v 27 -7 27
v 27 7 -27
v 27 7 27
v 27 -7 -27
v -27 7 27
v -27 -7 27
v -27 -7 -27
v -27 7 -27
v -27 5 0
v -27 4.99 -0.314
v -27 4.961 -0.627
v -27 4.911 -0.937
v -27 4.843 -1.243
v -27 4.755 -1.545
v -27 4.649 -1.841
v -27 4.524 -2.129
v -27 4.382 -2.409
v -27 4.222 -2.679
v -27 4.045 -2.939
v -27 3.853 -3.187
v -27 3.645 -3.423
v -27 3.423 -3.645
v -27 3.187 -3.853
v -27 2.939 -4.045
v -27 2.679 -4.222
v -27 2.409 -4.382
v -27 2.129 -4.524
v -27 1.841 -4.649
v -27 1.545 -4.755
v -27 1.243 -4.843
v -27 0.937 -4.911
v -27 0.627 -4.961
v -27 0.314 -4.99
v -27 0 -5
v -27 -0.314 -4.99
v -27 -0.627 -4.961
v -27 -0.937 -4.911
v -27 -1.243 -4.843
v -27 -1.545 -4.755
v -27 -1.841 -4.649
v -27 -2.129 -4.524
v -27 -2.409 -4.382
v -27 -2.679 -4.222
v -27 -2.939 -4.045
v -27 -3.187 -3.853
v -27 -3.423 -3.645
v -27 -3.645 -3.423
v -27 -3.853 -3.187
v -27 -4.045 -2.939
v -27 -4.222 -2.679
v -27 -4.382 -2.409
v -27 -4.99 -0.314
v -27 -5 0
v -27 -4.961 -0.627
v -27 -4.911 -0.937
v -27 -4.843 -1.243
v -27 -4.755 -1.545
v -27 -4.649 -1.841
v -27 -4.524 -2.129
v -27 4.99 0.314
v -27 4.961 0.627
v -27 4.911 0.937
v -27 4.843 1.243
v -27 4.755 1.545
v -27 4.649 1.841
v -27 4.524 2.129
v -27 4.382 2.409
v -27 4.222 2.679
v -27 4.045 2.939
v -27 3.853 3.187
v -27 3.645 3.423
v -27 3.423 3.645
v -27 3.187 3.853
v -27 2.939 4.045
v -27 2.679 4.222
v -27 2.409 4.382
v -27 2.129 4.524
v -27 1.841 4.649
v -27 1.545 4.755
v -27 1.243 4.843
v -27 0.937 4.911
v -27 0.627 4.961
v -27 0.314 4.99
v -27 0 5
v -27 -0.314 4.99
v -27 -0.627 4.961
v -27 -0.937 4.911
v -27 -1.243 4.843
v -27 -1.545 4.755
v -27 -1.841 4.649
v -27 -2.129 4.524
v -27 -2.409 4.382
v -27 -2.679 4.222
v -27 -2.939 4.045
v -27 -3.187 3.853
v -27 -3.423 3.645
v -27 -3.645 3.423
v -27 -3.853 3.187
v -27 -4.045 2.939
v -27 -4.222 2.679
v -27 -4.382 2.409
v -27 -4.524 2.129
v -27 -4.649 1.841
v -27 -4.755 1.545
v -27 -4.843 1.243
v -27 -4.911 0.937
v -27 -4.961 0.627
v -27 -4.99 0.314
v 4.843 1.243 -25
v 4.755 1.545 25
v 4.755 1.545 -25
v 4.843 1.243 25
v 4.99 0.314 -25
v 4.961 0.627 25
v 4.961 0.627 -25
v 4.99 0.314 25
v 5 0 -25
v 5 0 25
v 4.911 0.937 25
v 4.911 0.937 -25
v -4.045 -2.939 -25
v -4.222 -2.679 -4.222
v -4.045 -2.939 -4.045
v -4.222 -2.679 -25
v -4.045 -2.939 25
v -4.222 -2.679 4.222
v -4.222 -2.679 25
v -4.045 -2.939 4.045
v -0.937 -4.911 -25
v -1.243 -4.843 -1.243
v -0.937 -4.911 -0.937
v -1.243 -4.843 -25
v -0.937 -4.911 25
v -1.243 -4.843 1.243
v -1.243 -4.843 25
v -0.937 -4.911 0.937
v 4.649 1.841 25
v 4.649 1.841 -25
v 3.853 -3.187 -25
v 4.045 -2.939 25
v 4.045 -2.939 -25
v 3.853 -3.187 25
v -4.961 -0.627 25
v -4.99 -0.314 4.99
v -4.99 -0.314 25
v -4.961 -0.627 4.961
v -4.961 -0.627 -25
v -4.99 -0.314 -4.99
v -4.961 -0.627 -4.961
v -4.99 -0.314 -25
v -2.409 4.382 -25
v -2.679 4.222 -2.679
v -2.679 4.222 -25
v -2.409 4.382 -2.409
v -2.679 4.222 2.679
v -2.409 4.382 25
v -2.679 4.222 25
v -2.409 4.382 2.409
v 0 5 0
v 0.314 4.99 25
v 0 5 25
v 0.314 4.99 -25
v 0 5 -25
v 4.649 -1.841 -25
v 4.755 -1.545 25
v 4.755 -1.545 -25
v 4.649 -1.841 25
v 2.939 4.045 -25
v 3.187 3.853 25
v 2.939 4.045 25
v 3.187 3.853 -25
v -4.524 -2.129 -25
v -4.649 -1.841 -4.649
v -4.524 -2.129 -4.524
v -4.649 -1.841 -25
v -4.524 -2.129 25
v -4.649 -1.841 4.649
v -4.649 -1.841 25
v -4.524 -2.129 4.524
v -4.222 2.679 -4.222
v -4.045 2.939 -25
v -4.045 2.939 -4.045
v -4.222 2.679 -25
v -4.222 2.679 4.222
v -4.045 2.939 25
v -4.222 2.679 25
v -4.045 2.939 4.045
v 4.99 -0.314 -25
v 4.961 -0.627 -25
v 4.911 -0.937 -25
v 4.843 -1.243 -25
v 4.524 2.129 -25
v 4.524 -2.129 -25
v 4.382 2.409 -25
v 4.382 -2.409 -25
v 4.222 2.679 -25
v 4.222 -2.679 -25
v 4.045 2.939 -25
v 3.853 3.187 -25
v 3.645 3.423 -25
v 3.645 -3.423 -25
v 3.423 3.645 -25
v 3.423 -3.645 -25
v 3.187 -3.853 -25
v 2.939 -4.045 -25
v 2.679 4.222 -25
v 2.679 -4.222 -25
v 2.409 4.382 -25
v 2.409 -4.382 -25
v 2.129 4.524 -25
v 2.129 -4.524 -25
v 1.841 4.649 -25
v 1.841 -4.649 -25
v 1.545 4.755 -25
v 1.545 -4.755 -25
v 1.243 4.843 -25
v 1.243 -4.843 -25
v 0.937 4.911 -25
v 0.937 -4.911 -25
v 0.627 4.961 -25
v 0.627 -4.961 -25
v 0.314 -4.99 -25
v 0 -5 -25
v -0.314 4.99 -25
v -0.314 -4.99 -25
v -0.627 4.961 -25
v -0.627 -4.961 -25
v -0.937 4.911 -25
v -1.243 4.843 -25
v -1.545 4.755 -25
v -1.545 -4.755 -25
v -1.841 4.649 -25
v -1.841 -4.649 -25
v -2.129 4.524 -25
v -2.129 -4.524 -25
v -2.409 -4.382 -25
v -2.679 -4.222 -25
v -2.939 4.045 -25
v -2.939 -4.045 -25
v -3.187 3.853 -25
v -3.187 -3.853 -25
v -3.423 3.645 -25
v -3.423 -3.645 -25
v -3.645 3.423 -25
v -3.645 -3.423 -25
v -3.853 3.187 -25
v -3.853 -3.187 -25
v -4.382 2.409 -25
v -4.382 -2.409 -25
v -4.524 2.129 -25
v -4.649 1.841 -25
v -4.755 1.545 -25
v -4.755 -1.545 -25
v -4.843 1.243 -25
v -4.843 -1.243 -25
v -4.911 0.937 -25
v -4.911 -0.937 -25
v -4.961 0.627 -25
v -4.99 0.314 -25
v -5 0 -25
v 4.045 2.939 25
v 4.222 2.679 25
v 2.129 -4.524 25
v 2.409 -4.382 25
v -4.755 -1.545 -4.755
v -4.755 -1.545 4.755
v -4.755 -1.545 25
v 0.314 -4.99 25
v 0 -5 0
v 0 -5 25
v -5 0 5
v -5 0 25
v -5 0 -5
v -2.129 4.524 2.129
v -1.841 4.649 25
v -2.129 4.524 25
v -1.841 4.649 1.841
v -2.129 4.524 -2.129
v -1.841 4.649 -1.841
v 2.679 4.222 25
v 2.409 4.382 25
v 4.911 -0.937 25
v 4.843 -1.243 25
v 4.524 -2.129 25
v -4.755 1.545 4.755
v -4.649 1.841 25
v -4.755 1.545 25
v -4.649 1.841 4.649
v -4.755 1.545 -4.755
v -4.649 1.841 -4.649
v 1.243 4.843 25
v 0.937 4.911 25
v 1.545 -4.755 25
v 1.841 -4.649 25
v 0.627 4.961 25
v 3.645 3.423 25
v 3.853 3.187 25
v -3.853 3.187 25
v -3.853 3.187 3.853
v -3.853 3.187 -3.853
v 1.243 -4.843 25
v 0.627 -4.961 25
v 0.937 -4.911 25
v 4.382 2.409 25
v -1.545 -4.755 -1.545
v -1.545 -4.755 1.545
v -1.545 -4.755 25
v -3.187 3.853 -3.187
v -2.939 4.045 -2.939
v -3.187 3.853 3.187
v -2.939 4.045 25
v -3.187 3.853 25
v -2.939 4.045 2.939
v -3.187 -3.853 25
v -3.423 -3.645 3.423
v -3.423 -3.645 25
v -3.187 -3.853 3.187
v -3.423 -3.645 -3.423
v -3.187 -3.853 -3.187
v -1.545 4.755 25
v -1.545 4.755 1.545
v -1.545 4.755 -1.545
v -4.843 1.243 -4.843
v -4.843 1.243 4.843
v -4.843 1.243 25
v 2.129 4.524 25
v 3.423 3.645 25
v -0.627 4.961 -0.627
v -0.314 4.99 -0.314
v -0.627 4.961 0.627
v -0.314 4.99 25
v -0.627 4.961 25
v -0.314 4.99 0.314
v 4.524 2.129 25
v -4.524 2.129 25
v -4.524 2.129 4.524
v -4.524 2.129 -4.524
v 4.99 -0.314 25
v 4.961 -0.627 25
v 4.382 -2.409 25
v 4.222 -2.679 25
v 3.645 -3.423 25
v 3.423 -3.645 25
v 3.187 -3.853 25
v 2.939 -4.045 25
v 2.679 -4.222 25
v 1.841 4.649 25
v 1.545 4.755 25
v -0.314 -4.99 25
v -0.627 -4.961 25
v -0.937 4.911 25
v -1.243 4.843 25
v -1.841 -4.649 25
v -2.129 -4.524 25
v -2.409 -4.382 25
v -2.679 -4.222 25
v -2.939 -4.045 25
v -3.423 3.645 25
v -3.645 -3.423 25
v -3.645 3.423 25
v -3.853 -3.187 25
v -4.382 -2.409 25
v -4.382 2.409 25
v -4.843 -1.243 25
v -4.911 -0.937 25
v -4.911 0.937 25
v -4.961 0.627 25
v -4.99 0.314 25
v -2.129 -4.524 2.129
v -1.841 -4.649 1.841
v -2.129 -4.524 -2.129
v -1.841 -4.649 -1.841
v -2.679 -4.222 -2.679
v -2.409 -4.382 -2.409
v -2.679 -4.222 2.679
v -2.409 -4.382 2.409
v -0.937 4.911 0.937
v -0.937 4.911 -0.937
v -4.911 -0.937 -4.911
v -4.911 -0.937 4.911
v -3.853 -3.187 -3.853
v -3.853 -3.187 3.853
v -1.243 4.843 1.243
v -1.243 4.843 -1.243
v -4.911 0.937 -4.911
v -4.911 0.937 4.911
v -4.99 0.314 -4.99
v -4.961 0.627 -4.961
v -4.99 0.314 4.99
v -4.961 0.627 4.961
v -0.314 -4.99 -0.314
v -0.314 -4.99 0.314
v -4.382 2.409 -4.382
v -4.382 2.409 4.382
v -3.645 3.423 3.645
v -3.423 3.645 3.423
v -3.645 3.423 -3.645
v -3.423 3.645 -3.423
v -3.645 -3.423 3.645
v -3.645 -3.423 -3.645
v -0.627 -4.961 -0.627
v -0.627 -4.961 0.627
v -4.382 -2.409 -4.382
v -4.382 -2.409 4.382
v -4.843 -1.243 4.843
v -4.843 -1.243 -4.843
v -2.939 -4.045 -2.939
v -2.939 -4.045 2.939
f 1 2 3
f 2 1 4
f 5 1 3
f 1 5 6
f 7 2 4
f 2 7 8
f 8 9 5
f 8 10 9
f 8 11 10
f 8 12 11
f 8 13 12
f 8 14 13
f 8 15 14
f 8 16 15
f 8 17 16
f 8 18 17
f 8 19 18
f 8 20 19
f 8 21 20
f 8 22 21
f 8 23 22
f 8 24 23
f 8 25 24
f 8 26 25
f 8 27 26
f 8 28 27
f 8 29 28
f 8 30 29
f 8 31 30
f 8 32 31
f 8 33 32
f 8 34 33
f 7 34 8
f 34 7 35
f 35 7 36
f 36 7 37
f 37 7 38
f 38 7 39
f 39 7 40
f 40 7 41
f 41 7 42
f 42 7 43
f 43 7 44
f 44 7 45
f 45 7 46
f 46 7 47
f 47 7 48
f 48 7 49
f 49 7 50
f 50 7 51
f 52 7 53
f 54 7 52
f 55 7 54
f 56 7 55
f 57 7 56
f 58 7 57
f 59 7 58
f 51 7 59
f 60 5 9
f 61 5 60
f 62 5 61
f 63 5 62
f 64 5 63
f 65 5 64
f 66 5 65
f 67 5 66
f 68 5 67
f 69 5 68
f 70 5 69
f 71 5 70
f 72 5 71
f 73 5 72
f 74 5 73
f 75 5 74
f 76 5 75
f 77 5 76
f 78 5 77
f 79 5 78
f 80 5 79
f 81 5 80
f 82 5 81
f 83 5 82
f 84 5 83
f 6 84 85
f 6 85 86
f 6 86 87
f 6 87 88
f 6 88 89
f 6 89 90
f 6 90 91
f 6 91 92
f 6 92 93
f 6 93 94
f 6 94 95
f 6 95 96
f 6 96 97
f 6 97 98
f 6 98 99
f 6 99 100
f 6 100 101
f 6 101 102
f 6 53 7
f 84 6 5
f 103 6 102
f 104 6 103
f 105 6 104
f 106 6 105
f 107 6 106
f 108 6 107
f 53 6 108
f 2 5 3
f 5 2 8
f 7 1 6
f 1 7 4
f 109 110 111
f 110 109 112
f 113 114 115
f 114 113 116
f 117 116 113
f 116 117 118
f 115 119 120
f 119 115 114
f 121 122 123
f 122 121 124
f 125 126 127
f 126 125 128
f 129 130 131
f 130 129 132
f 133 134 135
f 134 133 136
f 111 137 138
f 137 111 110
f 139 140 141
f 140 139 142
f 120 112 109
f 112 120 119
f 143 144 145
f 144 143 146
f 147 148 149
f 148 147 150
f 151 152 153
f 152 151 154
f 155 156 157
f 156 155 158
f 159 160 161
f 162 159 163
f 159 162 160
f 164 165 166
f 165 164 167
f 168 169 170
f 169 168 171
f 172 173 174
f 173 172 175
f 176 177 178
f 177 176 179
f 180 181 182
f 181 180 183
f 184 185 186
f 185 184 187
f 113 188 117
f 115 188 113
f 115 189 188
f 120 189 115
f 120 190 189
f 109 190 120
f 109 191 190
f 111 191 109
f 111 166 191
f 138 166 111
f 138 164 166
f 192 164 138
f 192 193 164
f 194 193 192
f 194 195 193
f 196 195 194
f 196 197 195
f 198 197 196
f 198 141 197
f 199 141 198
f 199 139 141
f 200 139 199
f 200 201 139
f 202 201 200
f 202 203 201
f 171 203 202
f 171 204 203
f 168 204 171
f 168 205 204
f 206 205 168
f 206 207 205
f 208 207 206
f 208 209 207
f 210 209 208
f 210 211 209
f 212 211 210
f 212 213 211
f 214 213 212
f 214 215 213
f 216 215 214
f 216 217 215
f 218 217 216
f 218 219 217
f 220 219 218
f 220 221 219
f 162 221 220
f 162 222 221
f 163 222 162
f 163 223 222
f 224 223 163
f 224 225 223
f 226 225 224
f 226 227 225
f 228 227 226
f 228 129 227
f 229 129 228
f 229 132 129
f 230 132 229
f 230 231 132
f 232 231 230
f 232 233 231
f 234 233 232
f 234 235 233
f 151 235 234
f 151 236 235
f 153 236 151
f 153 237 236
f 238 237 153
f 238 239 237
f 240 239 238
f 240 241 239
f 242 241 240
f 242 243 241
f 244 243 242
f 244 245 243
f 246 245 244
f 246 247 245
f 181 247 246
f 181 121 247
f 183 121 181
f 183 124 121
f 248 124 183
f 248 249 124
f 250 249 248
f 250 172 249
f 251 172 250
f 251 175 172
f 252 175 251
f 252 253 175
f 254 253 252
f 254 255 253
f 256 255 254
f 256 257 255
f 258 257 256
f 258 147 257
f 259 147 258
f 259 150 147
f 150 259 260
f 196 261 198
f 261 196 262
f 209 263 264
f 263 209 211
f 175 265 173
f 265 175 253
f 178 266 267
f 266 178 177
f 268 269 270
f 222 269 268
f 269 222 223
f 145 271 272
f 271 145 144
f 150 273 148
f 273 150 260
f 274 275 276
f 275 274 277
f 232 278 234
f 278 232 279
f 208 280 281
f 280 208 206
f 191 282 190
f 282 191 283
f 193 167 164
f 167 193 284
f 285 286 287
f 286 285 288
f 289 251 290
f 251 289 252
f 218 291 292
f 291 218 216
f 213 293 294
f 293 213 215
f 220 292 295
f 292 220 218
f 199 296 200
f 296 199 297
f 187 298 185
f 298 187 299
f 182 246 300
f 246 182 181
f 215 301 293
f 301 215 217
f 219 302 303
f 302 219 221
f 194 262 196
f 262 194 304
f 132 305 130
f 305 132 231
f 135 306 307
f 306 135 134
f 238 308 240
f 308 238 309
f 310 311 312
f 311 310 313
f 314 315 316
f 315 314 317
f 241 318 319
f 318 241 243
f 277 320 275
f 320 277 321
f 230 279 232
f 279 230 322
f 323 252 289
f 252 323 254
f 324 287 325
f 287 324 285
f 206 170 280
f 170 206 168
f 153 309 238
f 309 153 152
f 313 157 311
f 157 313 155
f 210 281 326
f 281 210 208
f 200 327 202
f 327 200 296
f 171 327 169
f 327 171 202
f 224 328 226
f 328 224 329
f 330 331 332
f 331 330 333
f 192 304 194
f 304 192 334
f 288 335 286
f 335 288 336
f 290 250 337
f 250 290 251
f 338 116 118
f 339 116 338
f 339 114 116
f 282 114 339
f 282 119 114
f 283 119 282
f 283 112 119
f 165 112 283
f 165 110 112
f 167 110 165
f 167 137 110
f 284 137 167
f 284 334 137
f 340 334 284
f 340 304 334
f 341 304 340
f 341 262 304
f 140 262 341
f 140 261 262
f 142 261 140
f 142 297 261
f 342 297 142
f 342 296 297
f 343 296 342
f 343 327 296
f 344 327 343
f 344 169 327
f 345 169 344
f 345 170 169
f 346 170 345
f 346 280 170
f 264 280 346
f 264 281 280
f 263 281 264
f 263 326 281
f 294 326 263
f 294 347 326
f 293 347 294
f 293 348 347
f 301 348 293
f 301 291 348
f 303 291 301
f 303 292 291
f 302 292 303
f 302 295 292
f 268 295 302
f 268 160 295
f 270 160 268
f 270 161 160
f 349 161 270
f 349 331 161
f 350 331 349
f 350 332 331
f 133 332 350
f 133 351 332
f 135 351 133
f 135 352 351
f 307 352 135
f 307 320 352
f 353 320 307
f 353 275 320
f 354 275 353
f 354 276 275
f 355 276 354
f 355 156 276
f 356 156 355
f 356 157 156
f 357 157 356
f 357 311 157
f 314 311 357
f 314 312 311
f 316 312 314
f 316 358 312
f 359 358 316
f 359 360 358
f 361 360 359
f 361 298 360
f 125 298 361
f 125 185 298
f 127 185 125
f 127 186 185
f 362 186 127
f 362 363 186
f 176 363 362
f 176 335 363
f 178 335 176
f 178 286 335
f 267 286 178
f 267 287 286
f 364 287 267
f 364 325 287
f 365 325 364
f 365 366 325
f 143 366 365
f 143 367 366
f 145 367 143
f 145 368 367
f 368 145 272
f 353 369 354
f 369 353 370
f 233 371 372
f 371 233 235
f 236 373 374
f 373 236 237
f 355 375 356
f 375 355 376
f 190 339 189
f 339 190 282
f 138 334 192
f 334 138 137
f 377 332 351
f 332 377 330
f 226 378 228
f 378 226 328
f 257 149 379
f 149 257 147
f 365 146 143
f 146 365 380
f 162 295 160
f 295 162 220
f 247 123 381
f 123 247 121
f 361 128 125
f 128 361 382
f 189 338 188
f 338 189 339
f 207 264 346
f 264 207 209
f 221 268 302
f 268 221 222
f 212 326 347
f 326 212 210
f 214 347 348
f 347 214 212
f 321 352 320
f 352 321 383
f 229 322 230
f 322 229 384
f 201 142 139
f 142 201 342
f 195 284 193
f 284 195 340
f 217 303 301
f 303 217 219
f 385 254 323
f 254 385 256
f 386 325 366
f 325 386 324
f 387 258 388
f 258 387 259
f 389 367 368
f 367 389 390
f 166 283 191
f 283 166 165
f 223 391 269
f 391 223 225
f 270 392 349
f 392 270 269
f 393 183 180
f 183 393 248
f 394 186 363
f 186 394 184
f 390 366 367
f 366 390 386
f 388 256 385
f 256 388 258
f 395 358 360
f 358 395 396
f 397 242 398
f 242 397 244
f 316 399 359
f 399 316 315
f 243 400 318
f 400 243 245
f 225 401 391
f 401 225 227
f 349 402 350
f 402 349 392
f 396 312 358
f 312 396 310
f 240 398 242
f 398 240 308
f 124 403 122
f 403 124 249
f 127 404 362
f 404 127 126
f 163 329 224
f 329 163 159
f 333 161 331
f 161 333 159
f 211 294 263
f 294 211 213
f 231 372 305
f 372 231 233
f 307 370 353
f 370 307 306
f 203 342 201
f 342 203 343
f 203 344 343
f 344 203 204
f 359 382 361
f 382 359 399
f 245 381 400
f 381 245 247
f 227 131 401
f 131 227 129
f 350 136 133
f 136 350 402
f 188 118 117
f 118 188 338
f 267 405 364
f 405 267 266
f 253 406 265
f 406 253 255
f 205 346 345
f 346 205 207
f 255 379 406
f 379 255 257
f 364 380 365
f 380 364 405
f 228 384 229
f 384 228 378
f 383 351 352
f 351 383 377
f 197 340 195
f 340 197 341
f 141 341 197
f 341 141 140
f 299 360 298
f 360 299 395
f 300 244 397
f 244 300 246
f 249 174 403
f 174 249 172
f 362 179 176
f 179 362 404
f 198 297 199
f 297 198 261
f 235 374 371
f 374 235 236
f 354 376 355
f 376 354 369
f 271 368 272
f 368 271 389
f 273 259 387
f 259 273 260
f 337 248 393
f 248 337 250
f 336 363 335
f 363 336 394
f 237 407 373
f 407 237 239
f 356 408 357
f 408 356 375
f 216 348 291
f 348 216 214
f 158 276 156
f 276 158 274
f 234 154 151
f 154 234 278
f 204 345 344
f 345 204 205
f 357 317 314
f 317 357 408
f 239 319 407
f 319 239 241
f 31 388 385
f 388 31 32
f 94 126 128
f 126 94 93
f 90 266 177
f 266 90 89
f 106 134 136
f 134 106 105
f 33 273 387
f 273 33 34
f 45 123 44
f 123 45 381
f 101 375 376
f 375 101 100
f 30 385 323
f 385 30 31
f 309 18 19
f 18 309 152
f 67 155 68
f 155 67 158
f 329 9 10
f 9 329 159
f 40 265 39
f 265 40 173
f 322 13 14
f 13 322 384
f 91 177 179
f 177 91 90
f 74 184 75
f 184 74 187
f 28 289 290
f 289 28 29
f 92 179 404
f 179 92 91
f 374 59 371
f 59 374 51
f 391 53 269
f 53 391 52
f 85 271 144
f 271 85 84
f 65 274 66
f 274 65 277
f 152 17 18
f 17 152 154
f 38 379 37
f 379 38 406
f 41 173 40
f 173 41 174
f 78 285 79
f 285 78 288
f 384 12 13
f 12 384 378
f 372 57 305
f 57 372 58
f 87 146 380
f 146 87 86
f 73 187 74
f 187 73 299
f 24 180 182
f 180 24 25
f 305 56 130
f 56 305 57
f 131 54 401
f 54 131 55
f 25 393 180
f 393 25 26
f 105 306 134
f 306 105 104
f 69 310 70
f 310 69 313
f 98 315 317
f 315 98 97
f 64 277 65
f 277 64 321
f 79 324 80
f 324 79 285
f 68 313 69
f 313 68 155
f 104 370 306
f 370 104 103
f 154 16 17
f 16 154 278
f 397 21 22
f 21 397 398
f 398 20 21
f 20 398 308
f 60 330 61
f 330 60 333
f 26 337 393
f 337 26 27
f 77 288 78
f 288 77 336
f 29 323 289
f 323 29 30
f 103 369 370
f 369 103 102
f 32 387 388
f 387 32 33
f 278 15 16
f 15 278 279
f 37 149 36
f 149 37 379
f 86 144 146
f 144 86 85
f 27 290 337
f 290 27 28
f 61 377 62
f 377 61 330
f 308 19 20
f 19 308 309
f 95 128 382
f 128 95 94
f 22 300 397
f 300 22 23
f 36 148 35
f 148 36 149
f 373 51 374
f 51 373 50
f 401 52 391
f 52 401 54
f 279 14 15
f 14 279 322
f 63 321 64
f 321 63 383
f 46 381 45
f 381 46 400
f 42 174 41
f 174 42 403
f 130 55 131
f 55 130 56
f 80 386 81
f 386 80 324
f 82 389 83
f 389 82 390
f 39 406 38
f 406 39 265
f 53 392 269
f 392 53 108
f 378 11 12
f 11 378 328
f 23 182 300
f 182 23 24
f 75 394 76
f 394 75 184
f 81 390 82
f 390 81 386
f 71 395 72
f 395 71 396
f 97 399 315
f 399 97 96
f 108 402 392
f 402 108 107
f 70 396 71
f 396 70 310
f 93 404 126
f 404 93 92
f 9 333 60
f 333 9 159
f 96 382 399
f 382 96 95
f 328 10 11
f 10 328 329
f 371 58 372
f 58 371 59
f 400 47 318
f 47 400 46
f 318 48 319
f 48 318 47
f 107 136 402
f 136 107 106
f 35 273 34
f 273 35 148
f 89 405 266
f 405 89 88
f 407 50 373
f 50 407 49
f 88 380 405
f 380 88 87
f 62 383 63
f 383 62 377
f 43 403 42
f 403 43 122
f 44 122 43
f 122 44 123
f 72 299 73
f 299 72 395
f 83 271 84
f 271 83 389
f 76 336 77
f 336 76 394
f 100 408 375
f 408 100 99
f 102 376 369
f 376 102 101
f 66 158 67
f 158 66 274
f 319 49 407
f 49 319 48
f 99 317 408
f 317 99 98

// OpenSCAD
/* 
	Supplemental T-Junction 5

*/

$fn = 100;  // Increase the resolution of the cylinders
pipe_radius = 5;
pipe_length = 50;

// Define the cube dimensions
cube_size = [pipe_length + 4, 2*pipe_radius + 4, pipe_length + 4];

difference() {
    // Create the cube
    translate([0, 0, 0])
    cube(cube_size, center=true);

    // Subtract the x-axis pipe
    translate([0, 0, 0])
    cylinder(h=pipe_length, r=pipe_radius, center=true);

    // Subtract the y-axis pipe
    rotate([0, 90, 0])
    translate([0, 0, -pipe_length/2])
    cylinder(h=pipe_length, r=pipe_radius, center=true);
}
